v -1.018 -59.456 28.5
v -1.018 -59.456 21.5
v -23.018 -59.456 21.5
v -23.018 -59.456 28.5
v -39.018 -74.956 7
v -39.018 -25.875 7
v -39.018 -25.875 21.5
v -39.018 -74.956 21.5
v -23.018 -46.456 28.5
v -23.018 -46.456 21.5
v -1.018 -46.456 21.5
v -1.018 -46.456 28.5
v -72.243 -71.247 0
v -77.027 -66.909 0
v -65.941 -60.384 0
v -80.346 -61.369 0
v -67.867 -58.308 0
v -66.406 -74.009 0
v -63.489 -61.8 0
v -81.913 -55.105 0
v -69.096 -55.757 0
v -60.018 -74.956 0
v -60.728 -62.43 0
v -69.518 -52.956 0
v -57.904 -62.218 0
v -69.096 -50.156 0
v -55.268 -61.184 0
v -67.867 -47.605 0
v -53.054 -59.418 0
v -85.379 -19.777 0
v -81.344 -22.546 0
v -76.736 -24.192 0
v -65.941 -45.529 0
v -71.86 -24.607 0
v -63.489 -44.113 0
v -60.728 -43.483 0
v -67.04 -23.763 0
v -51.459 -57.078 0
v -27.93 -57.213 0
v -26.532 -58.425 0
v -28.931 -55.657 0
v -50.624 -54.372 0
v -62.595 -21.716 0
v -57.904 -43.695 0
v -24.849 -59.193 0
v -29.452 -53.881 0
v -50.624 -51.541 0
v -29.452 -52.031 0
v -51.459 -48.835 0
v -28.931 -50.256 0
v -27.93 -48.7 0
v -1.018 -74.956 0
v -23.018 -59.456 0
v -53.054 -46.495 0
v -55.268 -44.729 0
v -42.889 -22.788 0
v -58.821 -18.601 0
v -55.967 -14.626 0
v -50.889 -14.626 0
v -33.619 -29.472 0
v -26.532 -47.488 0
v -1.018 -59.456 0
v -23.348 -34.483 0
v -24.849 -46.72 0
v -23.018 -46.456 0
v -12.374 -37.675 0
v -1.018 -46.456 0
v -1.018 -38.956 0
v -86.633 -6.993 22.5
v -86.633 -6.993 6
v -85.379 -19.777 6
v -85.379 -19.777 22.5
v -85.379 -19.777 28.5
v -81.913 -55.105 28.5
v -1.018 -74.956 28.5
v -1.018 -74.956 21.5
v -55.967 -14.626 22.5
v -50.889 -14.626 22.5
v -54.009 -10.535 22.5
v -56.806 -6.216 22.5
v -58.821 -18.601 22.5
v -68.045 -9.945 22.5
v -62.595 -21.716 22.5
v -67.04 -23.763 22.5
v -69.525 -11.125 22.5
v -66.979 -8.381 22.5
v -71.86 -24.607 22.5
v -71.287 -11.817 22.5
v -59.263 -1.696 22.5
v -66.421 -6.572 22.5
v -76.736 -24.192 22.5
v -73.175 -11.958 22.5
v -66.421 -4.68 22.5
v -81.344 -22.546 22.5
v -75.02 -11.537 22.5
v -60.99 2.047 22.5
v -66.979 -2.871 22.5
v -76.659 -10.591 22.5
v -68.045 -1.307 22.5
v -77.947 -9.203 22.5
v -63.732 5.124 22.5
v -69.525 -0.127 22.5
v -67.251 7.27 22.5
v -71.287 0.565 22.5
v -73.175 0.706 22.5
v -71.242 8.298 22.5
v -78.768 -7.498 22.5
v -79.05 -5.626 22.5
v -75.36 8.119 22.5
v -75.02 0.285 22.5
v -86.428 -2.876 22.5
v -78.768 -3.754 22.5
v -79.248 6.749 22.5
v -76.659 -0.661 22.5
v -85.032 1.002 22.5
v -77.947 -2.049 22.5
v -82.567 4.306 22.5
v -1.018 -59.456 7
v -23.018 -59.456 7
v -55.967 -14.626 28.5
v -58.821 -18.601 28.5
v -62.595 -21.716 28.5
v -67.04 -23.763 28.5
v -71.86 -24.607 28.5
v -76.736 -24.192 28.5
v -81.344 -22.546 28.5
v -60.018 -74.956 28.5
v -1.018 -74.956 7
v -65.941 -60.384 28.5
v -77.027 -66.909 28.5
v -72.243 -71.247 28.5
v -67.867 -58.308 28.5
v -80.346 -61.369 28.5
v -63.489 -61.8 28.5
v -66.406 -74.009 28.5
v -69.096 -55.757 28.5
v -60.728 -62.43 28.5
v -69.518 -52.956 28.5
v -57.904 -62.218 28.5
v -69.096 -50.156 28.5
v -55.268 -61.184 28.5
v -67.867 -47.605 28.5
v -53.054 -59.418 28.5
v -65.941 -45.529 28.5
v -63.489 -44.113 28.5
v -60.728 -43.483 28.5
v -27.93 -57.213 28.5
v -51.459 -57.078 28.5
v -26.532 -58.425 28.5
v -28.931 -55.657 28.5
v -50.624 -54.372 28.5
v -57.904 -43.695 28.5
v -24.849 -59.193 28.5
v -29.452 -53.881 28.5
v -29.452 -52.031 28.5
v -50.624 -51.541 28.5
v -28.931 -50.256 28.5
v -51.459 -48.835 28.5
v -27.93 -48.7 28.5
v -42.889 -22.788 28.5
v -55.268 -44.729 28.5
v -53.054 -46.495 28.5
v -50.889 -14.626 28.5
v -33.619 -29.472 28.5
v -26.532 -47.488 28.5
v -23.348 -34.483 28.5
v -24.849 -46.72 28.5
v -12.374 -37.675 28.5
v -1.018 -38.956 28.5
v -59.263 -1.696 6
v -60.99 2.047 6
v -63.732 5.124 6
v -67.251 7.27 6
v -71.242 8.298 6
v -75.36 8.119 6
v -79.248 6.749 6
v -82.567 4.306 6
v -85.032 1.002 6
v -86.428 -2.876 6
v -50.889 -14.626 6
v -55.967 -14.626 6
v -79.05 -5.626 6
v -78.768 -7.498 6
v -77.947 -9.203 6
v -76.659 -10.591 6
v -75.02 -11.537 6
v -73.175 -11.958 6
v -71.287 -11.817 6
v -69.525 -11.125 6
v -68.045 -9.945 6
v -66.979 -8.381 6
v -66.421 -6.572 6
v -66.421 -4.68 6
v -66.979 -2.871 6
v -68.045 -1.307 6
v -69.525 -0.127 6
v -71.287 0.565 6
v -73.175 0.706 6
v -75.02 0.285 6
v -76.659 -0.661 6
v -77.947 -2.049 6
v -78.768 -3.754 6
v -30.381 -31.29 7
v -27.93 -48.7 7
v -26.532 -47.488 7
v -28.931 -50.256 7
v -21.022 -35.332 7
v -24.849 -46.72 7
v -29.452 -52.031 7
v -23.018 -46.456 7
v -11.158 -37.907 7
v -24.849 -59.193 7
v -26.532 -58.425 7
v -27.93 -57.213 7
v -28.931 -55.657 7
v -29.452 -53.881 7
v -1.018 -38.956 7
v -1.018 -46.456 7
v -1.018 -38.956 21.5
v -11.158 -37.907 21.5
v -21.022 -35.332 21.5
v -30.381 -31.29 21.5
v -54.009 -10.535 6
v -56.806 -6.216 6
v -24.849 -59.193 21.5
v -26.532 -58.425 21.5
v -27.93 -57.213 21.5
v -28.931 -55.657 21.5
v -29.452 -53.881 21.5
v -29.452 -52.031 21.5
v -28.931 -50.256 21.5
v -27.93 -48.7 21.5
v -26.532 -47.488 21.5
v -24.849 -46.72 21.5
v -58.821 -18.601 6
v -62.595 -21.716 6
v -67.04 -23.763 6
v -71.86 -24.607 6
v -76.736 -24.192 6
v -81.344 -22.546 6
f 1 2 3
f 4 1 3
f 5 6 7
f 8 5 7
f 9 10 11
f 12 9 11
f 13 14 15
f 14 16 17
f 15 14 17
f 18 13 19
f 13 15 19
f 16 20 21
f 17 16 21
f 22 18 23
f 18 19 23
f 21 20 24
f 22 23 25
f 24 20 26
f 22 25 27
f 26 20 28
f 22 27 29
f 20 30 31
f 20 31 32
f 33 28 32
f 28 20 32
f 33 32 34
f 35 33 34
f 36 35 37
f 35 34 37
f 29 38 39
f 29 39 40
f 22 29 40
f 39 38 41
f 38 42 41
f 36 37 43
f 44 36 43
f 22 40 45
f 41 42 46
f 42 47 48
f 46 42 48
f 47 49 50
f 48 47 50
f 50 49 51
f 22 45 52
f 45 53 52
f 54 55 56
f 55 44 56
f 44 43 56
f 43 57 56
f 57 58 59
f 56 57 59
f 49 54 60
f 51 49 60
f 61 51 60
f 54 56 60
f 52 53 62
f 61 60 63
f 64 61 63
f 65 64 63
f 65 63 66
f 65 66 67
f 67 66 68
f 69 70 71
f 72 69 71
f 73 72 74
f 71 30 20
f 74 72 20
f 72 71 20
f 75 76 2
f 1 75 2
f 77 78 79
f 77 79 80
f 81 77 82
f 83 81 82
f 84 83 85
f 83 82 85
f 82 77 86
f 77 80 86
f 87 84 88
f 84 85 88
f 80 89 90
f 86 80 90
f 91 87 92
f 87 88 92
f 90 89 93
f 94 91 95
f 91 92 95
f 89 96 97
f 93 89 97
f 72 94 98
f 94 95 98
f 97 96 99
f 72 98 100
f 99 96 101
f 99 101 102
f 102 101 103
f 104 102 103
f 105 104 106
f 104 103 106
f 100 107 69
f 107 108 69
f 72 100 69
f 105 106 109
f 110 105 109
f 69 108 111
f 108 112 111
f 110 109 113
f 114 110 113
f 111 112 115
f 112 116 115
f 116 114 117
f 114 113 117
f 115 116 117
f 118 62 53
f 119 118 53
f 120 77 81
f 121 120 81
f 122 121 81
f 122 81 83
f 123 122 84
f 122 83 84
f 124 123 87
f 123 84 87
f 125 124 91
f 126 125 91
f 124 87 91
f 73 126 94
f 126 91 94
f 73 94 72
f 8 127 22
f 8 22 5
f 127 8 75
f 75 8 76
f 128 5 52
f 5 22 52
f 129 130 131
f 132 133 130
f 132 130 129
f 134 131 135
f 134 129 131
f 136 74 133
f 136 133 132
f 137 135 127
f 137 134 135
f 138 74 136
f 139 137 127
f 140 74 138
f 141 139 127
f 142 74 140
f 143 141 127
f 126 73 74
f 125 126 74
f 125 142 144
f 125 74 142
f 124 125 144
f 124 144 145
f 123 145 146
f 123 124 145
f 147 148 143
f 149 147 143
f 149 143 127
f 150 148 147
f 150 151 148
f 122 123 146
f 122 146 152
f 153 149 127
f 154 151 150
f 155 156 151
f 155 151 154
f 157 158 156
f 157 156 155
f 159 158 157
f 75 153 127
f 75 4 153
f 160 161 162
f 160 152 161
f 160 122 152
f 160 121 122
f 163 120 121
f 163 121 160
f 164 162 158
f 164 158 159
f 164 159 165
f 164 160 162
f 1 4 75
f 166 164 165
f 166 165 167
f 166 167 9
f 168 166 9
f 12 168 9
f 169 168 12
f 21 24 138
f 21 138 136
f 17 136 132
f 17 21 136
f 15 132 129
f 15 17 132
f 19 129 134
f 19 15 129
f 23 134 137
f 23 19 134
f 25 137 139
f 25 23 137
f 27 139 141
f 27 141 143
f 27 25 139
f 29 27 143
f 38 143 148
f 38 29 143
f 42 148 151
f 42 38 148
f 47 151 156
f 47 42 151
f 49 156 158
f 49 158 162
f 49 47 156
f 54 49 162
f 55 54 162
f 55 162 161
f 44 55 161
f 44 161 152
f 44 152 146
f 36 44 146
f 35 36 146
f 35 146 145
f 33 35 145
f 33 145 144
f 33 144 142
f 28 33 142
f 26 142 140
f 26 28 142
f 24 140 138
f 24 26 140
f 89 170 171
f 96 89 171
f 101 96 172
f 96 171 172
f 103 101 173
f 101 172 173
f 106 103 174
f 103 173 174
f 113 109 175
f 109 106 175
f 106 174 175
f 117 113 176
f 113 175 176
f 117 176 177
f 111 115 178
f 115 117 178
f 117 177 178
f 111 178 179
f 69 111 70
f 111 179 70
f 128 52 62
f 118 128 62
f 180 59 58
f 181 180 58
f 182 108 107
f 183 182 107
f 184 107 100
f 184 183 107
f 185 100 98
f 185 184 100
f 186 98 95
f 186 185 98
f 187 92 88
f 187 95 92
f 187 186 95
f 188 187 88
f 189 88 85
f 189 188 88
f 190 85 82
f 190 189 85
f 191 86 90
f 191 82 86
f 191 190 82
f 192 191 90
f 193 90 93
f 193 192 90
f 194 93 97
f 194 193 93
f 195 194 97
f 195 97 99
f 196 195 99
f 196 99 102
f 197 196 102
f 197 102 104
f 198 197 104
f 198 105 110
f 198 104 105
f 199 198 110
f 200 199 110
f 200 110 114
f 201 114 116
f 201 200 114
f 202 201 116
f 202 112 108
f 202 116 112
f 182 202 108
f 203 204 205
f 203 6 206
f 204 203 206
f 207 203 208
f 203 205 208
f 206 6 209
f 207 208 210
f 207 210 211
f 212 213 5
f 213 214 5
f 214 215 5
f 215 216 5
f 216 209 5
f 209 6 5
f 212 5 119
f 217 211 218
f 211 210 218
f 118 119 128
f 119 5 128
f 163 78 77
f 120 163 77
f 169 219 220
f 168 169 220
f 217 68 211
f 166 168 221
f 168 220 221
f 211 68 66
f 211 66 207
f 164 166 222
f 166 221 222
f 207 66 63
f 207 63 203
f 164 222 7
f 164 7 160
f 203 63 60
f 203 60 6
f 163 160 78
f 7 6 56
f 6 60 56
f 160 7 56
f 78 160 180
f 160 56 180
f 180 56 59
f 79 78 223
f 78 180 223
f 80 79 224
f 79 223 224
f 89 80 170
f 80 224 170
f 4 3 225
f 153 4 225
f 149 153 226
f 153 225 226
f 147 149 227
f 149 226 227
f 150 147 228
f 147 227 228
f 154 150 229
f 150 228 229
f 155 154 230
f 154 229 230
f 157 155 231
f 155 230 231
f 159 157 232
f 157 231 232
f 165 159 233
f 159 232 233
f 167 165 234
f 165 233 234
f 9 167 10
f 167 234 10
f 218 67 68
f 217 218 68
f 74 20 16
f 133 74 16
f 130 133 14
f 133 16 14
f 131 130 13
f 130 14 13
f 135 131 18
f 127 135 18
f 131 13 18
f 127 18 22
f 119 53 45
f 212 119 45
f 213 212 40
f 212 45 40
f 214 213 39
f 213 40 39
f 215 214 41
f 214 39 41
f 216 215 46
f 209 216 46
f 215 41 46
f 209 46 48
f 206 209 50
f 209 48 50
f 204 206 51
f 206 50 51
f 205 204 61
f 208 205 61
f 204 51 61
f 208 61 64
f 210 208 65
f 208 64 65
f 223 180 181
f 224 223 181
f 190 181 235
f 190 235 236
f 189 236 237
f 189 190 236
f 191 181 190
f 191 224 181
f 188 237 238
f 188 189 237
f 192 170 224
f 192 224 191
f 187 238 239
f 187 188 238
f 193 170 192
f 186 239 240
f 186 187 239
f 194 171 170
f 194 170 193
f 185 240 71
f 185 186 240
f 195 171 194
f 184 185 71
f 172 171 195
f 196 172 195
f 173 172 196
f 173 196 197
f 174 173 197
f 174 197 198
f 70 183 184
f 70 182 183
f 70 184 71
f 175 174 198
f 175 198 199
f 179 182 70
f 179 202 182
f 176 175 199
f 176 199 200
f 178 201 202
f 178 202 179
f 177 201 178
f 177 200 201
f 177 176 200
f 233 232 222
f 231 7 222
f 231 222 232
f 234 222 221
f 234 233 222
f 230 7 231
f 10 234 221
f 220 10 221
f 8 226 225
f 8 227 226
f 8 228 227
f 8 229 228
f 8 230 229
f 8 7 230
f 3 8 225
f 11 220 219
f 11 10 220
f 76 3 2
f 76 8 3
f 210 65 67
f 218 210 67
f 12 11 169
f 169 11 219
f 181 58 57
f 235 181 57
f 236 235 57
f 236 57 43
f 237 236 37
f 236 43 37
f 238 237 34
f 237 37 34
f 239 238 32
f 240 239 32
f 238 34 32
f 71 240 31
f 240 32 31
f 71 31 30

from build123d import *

# Parameters (mm, degrees)
ESQUISSE1_R             = 6.35
ESQUISSE1_R_2           = 9.5
BOSS_EXTRU_1_DEPTH      = 28.5
ENL_V_START             = -6
ENL_V_MAT_EXTRU_1_DEPTH = 6
ENL_V_MAT_EXTRU_2_DEPTH = 6
ESQUISSE4_W             = 38
ESQUISSE4_H             = 14.5
ENL_V_MAT_EXTRU_3_DEPTH = 124.584469767


with BuildPart() as part:
    # Esquisse1 → Boss.-Extru.1 (new body)
    with BuildSketch(Plane.XY):
        with BuildLine():
            Line((-86.633280406, -6.99307262), (-81.912918385, -55.104590809))
            ThreePointArc((-81.912918385, -55.104590809), (-74.795399572, -69.254576275), (-60.018047616, -74.956420883))
            Line((-60.018047616, -74.956420883), (-1.018047616, -74.956420883))
            Line((-1.018047616, -74.956420883), (-1.018047616, -59.456420883))
            Line((-1.018047616, -59.456420883), (-23.018047616, -59.456420883))
            ThreePointArc((-23.018047616, -59.456420883), (-29.518047616, -52.956420883), (-23.018047616, -46.456420883))
            Line((-23.018047616, -46.456420883), (-1.018047616, -46.456420883))
            Line((-1.018047616, -46.456420883), (-1.018047616, -38.956420883))
            ThreePointArc((-1.018047616, -38.956420883), (-35.318453229, -28.420111536), (-59.263146108, -1.695902984))
            ThreePointArc((-59.263146108, -1.695902984), (-75.360354059, 8.118888343), (-86.633280406, -6.99307262))
        make_face()
        with Locations(Location((-72.700180587, -5.626055331, 0), (0, 0, 180))):
            Circle(ESQUISSE1_R, mode=Mode.SUBTRACT)
        with Locations(Location((-60.018047616, -52.956420883, 0), (0, 0, 180))):
            Circle(ESQUISSE1_R_2, mode=Mode.SUBTRACT)
    extrude(amount=BOSS_EXTRU_1_DEPTH)

    # Esquisse2 → Enlèv. mat.-Extru.1 (cut)
    with BuildSketch(Plane.XY.offset(28.5).offset(ENL_V_START)):
        with BuildLine():
            Line((-50.888781824, -14.626055395), (-55.966980296, -14.626055395))
            ThreePointArc((-55.966980296, -14.626055395), (-69.422632675, -24.341227799), (-85.379019392, -19.776922952))
            Line((-85.379019392, -19.776922952), (-86.633280406, -6.99307262))
            ThreePointArc((-86.633280406, -6.99307262), (-75.360354059, 8.118888343), (-59.263146108, -1.695902984))
            ThreePointArc((-59.263146108, -1.695902984), (-55.448825079, -8.402467045), (-50.888781824, -14.626055395))
        make_face()
    extrude(amount=ENL_V_MAT_EXTRU_1_DEPTH, mode=Mode.SUBTRACT)

    # Esquisse3 → Enlèv. mat.-Extru.2 (cut)
    with BuildSketch(Plane(origin=(0, 0, 0), x_dir=(-1, 0, 0), z_dir=(0, 0, -1))):
        with BuildLine():
            Line((85.379019392, -19.776922952), (86.633280406, -6.99307262))
            ThreePointArc((86.633280406, -6.99307262), (75.360354059, 8.118888343), (59.263146108, -1.695902984))
            ThreePointArc((59.263146108, -1.695902984), (55.448825079, -8.402467045), (50.888781824, -14.626055395))
            Line((50.888781824, -14.626055395), (55.966980296, -14.626055395))
            ThreePointArc((55.966980296, -14.626055395), (69.422632675, -24.341227799), (85.379019392, -19.776922952))
        make_face()
    extrude(amount=-ENL_V_MAT_EXTRU_2_DEPTH, mode=Mode.SUBTRACT)

    # Esquisse4 → Enlèv. mat.-Extru.3 (cut, through all)
    with BuildSketch(Plane.XZ.offset(74.956420883)):
        with Locations((-20.018047616, 14.25)):
            Rectangle(ESQUISSE4_W, ESQUISSE4_H)
    extrude(amount=-ENL_V_MAT_EXTRU_3_DEPTH, mode=Mode.SUBTRACT)


solid = part.part
